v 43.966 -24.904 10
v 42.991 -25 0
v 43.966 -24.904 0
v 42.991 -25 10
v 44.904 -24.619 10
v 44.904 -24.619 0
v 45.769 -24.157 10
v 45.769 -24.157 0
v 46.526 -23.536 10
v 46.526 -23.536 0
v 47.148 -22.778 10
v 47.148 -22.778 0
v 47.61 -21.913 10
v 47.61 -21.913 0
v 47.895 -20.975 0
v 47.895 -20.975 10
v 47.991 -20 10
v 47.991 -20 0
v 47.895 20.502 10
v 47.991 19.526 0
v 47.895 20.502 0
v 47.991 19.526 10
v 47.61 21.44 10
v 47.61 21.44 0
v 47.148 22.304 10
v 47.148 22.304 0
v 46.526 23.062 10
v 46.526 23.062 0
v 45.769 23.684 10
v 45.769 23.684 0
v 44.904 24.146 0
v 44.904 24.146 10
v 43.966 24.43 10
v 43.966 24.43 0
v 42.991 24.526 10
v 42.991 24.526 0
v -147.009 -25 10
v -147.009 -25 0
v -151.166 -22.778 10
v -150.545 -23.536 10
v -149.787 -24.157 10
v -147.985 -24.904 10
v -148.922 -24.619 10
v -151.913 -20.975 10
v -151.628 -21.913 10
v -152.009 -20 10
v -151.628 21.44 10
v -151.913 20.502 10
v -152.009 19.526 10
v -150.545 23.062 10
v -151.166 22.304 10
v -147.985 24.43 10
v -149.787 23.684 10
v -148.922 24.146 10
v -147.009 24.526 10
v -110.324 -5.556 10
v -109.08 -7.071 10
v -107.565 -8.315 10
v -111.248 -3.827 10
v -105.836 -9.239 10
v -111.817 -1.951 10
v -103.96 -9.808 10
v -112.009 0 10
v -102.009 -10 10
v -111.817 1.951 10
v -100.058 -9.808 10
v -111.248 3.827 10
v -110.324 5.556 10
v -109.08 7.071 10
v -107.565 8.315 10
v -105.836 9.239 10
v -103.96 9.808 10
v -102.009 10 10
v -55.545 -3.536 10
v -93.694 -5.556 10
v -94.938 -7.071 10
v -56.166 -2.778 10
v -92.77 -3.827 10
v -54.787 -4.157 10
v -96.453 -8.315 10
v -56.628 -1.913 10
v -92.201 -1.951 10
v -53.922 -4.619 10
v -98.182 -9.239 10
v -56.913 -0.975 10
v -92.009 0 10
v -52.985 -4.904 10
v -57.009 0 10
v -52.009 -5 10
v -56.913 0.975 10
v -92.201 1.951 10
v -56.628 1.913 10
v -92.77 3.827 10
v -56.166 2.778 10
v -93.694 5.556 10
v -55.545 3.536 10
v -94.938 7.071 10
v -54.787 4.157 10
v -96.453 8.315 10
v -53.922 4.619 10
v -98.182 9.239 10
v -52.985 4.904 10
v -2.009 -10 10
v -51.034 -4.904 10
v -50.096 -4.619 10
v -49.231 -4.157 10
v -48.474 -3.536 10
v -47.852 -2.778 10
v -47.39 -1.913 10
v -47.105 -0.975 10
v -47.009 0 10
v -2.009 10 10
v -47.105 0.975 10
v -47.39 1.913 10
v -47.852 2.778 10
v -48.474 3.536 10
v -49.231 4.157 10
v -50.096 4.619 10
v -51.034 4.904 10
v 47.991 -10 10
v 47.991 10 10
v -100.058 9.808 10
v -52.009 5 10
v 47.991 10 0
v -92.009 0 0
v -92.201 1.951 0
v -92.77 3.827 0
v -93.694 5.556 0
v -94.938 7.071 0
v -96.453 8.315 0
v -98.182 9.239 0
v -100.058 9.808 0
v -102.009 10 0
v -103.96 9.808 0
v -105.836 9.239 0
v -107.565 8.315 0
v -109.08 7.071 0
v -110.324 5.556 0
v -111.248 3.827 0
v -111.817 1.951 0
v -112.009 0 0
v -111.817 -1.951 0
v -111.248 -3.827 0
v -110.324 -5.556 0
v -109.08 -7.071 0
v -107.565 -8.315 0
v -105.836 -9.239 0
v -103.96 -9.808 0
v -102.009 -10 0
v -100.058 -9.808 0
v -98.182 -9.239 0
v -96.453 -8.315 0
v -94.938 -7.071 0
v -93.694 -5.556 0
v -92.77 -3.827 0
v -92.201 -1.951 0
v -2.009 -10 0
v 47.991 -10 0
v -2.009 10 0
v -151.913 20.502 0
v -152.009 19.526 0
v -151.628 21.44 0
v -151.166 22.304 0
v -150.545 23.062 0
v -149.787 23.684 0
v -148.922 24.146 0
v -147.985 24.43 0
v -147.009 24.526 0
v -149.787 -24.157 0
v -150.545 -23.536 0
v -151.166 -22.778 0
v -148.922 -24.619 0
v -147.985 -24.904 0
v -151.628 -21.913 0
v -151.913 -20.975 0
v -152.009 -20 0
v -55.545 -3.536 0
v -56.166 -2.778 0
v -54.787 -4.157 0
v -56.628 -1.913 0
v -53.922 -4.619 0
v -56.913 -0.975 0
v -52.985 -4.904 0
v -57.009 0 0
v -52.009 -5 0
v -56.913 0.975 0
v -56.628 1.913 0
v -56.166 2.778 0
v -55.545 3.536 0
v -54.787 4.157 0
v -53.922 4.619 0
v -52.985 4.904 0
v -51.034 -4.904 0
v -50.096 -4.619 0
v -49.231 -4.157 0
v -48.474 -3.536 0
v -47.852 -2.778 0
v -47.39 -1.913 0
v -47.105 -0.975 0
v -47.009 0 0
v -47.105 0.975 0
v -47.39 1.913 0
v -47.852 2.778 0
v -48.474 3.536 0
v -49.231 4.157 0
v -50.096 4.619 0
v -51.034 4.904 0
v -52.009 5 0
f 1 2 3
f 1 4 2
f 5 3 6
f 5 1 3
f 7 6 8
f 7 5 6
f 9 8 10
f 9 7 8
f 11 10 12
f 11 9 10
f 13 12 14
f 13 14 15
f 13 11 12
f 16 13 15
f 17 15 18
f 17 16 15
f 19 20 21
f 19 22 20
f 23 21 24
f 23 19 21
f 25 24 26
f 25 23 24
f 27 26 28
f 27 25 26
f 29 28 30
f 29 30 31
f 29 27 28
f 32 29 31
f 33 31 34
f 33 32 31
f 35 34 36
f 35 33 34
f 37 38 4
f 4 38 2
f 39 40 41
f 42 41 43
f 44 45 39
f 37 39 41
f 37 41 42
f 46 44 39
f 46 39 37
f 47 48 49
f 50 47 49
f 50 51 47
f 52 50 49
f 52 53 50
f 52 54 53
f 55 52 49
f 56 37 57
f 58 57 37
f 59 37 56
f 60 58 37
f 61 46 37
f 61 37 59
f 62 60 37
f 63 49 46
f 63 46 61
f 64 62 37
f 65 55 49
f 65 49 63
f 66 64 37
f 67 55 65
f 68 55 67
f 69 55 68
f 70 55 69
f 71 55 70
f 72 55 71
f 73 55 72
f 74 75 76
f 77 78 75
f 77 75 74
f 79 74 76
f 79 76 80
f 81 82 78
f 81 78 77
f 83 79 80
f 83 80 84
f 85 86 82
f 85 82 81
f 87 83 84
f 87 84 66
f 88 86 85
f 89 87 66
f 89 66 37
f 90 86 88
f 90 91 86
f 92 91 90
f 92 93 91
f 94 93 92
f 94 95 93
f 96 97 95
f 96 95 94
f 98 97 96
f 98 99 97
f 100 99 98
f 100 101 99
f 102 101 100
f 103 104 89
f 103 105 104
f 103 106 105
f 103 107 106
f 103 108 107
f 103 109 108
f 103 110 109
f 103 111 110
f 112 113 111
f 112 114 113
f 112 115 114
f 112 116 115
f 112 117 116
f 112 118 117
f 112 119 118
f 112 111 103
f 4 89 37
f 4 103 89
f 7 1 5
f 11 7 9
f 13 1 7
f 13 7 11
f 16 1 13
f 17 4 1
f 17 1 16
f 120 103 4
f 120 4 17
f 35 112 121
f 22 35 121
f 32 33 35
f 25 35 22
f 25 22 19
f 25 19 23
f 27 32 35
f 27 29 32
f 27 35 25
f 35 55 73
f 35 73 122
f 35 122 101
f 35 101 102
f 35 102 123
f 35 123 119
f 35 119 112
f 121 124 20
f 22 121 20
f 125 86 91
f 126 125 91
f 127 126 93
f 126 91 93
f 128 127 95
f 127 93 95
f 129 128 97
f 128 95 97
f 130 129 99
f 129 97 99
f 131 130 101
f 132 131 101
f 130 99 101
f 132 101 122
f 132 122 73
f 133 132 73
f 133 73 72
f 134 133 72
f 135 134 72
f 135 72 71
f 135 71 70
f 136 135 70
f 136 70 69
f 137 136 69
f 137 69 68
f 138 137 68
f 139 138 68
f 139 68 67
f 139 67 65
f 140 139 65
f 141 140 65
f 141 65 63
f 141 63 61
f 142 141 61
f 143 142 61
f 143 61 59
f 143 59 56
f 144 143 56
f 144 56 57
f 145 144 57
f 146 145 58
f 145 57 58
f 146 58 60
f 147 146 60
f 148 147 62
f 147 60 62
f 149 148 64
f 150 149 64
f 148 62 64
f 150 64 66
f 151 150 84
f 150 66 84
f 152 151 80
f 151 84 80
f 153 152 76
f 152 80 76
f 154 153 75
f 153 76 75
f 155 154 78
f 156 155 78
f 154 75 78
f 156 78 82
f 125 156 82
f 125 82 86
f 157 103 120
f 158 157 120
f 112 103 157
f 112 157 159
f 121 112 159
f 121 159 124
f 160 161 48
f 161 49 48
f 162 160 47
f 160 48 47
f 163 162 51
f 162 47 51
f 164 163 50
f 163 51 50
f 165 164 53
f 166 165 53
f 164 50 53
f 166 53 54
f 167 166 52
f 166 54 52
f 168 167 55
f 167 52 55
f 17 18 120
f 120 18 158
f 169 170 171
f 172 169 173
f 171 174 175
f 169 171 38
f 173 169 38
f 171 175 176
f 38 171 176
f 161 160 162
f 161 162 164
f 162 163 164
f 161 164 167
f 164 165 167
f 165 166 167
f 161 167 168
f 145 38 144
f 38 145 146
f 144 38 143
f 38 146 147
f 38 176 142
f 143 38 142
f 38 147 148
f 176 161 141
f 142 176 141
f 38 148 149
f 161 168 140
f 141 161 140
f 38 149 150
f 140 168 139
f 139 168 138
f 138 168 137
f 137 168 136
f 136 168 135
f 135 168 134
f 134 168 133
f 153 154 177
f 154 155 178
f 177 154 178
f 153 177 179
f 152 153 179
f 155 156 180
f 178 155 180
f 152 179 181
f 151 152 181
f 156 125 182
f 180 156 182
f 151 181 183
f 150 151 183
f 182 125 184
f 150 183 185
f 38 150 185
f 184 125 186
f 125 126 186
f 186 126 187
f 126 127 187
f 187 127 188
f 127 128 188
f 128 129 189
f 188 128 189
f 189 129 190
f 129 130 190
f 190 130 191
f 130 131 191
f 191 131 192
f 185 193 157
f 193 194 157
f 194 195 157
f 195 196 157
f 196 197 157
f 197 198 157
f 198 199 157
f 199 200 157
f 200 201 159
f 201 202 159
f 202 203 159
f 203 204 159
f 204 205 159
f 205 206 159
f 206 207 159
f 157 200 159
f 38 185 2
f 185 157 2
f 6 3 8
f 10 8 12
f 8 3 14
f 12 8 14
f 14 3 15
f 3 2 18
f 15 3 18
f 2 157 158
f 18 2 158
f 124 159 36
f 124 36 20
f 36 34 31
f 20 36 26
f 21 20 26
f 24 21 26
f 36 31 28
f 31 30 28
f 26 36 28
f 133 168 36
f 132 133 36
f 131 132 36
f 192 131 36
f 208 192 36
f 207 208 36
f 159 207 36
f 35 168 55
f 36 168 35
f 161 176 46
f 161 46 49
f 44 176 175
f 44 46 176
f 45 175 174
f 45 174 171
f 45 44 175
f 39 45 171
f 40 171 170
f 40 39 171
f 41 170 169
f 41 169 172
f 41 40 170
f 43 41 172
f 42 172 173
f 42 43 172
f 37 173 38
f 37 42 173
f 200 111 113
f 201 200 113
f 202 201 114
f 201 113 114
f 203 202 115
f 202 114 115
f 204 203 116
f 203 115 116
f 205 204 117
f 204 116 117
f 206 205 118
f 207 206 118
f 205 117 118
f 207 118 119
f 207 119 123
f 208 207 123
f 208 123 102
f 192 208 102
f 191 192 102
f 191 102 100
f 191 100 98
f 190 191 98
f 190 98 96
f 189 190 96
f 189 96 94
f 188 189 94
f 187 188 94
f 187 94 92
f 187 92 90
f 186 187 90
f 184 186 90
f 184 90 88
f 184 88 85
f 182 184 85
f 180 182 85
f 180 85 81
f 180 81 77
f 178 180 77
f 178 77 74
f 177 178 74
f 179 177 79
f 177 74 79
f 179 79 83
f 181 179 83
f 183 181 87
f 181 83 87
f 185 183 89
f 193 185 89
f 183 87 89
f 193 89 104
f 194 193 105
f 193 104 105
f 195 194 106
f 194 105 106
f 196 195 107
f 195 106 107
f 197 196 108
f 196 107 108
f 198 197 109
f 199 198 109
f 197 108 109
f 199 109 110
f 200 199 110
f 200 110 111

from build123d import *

# Parameters (mm, degrees)
F0_W     = 200
F0_H     = 49.526437
F1_DEPTH = 10
F2_R     = 5
F3_R     = 5
F3_R_2   = 10
F4_DEPTH = 10.001
F5_W     = 50
F5_H     = 20
F6_DEPTH = 25


with BuildPart() as f1:
    # F0 (on Top) → F1 (new body)
    with BuildSketch(Plane.XY):
        with Locations((-52.009064, -0.236782)):
            Rectangle(F0_W, F0_H)
    extrude(amount=F1_DEPTH)

    # F2
    f2_edges = [f1.edges().sort_by_distance(p)[0] for p in [
        (47.990936, -25, 5),
        (47.990936, 24.526437, 5),
        (-152.009064, -25, 5),
        (-152.009064, 24.526437, 5),
    ]]
    fillet(f2_edges, radius=F2_R)

    # F3 (on face) → F4 (cut, through all)
    with BuildSketch(Plane.XY.offset(10)):
        with Locations((-52.009064, 0)):
            Circle(F3_R)
        with Locations((-102.009064, 0)):
            Circle(F3_R_2)
    extrude(amount=-F4_DEPTH, mode=Mode.SUBTRACT)

    # F5 (on face) → F6 (cut)
    with BuildSketch(Plane.XY.offset(10)):
        with Locations((22.990936, 0)):
            Rectangle(F5_W, F5_H)
    extrude(amount=-F6_DEPTH, mode=Mode.SUBTRACT)


solid = f1.part
